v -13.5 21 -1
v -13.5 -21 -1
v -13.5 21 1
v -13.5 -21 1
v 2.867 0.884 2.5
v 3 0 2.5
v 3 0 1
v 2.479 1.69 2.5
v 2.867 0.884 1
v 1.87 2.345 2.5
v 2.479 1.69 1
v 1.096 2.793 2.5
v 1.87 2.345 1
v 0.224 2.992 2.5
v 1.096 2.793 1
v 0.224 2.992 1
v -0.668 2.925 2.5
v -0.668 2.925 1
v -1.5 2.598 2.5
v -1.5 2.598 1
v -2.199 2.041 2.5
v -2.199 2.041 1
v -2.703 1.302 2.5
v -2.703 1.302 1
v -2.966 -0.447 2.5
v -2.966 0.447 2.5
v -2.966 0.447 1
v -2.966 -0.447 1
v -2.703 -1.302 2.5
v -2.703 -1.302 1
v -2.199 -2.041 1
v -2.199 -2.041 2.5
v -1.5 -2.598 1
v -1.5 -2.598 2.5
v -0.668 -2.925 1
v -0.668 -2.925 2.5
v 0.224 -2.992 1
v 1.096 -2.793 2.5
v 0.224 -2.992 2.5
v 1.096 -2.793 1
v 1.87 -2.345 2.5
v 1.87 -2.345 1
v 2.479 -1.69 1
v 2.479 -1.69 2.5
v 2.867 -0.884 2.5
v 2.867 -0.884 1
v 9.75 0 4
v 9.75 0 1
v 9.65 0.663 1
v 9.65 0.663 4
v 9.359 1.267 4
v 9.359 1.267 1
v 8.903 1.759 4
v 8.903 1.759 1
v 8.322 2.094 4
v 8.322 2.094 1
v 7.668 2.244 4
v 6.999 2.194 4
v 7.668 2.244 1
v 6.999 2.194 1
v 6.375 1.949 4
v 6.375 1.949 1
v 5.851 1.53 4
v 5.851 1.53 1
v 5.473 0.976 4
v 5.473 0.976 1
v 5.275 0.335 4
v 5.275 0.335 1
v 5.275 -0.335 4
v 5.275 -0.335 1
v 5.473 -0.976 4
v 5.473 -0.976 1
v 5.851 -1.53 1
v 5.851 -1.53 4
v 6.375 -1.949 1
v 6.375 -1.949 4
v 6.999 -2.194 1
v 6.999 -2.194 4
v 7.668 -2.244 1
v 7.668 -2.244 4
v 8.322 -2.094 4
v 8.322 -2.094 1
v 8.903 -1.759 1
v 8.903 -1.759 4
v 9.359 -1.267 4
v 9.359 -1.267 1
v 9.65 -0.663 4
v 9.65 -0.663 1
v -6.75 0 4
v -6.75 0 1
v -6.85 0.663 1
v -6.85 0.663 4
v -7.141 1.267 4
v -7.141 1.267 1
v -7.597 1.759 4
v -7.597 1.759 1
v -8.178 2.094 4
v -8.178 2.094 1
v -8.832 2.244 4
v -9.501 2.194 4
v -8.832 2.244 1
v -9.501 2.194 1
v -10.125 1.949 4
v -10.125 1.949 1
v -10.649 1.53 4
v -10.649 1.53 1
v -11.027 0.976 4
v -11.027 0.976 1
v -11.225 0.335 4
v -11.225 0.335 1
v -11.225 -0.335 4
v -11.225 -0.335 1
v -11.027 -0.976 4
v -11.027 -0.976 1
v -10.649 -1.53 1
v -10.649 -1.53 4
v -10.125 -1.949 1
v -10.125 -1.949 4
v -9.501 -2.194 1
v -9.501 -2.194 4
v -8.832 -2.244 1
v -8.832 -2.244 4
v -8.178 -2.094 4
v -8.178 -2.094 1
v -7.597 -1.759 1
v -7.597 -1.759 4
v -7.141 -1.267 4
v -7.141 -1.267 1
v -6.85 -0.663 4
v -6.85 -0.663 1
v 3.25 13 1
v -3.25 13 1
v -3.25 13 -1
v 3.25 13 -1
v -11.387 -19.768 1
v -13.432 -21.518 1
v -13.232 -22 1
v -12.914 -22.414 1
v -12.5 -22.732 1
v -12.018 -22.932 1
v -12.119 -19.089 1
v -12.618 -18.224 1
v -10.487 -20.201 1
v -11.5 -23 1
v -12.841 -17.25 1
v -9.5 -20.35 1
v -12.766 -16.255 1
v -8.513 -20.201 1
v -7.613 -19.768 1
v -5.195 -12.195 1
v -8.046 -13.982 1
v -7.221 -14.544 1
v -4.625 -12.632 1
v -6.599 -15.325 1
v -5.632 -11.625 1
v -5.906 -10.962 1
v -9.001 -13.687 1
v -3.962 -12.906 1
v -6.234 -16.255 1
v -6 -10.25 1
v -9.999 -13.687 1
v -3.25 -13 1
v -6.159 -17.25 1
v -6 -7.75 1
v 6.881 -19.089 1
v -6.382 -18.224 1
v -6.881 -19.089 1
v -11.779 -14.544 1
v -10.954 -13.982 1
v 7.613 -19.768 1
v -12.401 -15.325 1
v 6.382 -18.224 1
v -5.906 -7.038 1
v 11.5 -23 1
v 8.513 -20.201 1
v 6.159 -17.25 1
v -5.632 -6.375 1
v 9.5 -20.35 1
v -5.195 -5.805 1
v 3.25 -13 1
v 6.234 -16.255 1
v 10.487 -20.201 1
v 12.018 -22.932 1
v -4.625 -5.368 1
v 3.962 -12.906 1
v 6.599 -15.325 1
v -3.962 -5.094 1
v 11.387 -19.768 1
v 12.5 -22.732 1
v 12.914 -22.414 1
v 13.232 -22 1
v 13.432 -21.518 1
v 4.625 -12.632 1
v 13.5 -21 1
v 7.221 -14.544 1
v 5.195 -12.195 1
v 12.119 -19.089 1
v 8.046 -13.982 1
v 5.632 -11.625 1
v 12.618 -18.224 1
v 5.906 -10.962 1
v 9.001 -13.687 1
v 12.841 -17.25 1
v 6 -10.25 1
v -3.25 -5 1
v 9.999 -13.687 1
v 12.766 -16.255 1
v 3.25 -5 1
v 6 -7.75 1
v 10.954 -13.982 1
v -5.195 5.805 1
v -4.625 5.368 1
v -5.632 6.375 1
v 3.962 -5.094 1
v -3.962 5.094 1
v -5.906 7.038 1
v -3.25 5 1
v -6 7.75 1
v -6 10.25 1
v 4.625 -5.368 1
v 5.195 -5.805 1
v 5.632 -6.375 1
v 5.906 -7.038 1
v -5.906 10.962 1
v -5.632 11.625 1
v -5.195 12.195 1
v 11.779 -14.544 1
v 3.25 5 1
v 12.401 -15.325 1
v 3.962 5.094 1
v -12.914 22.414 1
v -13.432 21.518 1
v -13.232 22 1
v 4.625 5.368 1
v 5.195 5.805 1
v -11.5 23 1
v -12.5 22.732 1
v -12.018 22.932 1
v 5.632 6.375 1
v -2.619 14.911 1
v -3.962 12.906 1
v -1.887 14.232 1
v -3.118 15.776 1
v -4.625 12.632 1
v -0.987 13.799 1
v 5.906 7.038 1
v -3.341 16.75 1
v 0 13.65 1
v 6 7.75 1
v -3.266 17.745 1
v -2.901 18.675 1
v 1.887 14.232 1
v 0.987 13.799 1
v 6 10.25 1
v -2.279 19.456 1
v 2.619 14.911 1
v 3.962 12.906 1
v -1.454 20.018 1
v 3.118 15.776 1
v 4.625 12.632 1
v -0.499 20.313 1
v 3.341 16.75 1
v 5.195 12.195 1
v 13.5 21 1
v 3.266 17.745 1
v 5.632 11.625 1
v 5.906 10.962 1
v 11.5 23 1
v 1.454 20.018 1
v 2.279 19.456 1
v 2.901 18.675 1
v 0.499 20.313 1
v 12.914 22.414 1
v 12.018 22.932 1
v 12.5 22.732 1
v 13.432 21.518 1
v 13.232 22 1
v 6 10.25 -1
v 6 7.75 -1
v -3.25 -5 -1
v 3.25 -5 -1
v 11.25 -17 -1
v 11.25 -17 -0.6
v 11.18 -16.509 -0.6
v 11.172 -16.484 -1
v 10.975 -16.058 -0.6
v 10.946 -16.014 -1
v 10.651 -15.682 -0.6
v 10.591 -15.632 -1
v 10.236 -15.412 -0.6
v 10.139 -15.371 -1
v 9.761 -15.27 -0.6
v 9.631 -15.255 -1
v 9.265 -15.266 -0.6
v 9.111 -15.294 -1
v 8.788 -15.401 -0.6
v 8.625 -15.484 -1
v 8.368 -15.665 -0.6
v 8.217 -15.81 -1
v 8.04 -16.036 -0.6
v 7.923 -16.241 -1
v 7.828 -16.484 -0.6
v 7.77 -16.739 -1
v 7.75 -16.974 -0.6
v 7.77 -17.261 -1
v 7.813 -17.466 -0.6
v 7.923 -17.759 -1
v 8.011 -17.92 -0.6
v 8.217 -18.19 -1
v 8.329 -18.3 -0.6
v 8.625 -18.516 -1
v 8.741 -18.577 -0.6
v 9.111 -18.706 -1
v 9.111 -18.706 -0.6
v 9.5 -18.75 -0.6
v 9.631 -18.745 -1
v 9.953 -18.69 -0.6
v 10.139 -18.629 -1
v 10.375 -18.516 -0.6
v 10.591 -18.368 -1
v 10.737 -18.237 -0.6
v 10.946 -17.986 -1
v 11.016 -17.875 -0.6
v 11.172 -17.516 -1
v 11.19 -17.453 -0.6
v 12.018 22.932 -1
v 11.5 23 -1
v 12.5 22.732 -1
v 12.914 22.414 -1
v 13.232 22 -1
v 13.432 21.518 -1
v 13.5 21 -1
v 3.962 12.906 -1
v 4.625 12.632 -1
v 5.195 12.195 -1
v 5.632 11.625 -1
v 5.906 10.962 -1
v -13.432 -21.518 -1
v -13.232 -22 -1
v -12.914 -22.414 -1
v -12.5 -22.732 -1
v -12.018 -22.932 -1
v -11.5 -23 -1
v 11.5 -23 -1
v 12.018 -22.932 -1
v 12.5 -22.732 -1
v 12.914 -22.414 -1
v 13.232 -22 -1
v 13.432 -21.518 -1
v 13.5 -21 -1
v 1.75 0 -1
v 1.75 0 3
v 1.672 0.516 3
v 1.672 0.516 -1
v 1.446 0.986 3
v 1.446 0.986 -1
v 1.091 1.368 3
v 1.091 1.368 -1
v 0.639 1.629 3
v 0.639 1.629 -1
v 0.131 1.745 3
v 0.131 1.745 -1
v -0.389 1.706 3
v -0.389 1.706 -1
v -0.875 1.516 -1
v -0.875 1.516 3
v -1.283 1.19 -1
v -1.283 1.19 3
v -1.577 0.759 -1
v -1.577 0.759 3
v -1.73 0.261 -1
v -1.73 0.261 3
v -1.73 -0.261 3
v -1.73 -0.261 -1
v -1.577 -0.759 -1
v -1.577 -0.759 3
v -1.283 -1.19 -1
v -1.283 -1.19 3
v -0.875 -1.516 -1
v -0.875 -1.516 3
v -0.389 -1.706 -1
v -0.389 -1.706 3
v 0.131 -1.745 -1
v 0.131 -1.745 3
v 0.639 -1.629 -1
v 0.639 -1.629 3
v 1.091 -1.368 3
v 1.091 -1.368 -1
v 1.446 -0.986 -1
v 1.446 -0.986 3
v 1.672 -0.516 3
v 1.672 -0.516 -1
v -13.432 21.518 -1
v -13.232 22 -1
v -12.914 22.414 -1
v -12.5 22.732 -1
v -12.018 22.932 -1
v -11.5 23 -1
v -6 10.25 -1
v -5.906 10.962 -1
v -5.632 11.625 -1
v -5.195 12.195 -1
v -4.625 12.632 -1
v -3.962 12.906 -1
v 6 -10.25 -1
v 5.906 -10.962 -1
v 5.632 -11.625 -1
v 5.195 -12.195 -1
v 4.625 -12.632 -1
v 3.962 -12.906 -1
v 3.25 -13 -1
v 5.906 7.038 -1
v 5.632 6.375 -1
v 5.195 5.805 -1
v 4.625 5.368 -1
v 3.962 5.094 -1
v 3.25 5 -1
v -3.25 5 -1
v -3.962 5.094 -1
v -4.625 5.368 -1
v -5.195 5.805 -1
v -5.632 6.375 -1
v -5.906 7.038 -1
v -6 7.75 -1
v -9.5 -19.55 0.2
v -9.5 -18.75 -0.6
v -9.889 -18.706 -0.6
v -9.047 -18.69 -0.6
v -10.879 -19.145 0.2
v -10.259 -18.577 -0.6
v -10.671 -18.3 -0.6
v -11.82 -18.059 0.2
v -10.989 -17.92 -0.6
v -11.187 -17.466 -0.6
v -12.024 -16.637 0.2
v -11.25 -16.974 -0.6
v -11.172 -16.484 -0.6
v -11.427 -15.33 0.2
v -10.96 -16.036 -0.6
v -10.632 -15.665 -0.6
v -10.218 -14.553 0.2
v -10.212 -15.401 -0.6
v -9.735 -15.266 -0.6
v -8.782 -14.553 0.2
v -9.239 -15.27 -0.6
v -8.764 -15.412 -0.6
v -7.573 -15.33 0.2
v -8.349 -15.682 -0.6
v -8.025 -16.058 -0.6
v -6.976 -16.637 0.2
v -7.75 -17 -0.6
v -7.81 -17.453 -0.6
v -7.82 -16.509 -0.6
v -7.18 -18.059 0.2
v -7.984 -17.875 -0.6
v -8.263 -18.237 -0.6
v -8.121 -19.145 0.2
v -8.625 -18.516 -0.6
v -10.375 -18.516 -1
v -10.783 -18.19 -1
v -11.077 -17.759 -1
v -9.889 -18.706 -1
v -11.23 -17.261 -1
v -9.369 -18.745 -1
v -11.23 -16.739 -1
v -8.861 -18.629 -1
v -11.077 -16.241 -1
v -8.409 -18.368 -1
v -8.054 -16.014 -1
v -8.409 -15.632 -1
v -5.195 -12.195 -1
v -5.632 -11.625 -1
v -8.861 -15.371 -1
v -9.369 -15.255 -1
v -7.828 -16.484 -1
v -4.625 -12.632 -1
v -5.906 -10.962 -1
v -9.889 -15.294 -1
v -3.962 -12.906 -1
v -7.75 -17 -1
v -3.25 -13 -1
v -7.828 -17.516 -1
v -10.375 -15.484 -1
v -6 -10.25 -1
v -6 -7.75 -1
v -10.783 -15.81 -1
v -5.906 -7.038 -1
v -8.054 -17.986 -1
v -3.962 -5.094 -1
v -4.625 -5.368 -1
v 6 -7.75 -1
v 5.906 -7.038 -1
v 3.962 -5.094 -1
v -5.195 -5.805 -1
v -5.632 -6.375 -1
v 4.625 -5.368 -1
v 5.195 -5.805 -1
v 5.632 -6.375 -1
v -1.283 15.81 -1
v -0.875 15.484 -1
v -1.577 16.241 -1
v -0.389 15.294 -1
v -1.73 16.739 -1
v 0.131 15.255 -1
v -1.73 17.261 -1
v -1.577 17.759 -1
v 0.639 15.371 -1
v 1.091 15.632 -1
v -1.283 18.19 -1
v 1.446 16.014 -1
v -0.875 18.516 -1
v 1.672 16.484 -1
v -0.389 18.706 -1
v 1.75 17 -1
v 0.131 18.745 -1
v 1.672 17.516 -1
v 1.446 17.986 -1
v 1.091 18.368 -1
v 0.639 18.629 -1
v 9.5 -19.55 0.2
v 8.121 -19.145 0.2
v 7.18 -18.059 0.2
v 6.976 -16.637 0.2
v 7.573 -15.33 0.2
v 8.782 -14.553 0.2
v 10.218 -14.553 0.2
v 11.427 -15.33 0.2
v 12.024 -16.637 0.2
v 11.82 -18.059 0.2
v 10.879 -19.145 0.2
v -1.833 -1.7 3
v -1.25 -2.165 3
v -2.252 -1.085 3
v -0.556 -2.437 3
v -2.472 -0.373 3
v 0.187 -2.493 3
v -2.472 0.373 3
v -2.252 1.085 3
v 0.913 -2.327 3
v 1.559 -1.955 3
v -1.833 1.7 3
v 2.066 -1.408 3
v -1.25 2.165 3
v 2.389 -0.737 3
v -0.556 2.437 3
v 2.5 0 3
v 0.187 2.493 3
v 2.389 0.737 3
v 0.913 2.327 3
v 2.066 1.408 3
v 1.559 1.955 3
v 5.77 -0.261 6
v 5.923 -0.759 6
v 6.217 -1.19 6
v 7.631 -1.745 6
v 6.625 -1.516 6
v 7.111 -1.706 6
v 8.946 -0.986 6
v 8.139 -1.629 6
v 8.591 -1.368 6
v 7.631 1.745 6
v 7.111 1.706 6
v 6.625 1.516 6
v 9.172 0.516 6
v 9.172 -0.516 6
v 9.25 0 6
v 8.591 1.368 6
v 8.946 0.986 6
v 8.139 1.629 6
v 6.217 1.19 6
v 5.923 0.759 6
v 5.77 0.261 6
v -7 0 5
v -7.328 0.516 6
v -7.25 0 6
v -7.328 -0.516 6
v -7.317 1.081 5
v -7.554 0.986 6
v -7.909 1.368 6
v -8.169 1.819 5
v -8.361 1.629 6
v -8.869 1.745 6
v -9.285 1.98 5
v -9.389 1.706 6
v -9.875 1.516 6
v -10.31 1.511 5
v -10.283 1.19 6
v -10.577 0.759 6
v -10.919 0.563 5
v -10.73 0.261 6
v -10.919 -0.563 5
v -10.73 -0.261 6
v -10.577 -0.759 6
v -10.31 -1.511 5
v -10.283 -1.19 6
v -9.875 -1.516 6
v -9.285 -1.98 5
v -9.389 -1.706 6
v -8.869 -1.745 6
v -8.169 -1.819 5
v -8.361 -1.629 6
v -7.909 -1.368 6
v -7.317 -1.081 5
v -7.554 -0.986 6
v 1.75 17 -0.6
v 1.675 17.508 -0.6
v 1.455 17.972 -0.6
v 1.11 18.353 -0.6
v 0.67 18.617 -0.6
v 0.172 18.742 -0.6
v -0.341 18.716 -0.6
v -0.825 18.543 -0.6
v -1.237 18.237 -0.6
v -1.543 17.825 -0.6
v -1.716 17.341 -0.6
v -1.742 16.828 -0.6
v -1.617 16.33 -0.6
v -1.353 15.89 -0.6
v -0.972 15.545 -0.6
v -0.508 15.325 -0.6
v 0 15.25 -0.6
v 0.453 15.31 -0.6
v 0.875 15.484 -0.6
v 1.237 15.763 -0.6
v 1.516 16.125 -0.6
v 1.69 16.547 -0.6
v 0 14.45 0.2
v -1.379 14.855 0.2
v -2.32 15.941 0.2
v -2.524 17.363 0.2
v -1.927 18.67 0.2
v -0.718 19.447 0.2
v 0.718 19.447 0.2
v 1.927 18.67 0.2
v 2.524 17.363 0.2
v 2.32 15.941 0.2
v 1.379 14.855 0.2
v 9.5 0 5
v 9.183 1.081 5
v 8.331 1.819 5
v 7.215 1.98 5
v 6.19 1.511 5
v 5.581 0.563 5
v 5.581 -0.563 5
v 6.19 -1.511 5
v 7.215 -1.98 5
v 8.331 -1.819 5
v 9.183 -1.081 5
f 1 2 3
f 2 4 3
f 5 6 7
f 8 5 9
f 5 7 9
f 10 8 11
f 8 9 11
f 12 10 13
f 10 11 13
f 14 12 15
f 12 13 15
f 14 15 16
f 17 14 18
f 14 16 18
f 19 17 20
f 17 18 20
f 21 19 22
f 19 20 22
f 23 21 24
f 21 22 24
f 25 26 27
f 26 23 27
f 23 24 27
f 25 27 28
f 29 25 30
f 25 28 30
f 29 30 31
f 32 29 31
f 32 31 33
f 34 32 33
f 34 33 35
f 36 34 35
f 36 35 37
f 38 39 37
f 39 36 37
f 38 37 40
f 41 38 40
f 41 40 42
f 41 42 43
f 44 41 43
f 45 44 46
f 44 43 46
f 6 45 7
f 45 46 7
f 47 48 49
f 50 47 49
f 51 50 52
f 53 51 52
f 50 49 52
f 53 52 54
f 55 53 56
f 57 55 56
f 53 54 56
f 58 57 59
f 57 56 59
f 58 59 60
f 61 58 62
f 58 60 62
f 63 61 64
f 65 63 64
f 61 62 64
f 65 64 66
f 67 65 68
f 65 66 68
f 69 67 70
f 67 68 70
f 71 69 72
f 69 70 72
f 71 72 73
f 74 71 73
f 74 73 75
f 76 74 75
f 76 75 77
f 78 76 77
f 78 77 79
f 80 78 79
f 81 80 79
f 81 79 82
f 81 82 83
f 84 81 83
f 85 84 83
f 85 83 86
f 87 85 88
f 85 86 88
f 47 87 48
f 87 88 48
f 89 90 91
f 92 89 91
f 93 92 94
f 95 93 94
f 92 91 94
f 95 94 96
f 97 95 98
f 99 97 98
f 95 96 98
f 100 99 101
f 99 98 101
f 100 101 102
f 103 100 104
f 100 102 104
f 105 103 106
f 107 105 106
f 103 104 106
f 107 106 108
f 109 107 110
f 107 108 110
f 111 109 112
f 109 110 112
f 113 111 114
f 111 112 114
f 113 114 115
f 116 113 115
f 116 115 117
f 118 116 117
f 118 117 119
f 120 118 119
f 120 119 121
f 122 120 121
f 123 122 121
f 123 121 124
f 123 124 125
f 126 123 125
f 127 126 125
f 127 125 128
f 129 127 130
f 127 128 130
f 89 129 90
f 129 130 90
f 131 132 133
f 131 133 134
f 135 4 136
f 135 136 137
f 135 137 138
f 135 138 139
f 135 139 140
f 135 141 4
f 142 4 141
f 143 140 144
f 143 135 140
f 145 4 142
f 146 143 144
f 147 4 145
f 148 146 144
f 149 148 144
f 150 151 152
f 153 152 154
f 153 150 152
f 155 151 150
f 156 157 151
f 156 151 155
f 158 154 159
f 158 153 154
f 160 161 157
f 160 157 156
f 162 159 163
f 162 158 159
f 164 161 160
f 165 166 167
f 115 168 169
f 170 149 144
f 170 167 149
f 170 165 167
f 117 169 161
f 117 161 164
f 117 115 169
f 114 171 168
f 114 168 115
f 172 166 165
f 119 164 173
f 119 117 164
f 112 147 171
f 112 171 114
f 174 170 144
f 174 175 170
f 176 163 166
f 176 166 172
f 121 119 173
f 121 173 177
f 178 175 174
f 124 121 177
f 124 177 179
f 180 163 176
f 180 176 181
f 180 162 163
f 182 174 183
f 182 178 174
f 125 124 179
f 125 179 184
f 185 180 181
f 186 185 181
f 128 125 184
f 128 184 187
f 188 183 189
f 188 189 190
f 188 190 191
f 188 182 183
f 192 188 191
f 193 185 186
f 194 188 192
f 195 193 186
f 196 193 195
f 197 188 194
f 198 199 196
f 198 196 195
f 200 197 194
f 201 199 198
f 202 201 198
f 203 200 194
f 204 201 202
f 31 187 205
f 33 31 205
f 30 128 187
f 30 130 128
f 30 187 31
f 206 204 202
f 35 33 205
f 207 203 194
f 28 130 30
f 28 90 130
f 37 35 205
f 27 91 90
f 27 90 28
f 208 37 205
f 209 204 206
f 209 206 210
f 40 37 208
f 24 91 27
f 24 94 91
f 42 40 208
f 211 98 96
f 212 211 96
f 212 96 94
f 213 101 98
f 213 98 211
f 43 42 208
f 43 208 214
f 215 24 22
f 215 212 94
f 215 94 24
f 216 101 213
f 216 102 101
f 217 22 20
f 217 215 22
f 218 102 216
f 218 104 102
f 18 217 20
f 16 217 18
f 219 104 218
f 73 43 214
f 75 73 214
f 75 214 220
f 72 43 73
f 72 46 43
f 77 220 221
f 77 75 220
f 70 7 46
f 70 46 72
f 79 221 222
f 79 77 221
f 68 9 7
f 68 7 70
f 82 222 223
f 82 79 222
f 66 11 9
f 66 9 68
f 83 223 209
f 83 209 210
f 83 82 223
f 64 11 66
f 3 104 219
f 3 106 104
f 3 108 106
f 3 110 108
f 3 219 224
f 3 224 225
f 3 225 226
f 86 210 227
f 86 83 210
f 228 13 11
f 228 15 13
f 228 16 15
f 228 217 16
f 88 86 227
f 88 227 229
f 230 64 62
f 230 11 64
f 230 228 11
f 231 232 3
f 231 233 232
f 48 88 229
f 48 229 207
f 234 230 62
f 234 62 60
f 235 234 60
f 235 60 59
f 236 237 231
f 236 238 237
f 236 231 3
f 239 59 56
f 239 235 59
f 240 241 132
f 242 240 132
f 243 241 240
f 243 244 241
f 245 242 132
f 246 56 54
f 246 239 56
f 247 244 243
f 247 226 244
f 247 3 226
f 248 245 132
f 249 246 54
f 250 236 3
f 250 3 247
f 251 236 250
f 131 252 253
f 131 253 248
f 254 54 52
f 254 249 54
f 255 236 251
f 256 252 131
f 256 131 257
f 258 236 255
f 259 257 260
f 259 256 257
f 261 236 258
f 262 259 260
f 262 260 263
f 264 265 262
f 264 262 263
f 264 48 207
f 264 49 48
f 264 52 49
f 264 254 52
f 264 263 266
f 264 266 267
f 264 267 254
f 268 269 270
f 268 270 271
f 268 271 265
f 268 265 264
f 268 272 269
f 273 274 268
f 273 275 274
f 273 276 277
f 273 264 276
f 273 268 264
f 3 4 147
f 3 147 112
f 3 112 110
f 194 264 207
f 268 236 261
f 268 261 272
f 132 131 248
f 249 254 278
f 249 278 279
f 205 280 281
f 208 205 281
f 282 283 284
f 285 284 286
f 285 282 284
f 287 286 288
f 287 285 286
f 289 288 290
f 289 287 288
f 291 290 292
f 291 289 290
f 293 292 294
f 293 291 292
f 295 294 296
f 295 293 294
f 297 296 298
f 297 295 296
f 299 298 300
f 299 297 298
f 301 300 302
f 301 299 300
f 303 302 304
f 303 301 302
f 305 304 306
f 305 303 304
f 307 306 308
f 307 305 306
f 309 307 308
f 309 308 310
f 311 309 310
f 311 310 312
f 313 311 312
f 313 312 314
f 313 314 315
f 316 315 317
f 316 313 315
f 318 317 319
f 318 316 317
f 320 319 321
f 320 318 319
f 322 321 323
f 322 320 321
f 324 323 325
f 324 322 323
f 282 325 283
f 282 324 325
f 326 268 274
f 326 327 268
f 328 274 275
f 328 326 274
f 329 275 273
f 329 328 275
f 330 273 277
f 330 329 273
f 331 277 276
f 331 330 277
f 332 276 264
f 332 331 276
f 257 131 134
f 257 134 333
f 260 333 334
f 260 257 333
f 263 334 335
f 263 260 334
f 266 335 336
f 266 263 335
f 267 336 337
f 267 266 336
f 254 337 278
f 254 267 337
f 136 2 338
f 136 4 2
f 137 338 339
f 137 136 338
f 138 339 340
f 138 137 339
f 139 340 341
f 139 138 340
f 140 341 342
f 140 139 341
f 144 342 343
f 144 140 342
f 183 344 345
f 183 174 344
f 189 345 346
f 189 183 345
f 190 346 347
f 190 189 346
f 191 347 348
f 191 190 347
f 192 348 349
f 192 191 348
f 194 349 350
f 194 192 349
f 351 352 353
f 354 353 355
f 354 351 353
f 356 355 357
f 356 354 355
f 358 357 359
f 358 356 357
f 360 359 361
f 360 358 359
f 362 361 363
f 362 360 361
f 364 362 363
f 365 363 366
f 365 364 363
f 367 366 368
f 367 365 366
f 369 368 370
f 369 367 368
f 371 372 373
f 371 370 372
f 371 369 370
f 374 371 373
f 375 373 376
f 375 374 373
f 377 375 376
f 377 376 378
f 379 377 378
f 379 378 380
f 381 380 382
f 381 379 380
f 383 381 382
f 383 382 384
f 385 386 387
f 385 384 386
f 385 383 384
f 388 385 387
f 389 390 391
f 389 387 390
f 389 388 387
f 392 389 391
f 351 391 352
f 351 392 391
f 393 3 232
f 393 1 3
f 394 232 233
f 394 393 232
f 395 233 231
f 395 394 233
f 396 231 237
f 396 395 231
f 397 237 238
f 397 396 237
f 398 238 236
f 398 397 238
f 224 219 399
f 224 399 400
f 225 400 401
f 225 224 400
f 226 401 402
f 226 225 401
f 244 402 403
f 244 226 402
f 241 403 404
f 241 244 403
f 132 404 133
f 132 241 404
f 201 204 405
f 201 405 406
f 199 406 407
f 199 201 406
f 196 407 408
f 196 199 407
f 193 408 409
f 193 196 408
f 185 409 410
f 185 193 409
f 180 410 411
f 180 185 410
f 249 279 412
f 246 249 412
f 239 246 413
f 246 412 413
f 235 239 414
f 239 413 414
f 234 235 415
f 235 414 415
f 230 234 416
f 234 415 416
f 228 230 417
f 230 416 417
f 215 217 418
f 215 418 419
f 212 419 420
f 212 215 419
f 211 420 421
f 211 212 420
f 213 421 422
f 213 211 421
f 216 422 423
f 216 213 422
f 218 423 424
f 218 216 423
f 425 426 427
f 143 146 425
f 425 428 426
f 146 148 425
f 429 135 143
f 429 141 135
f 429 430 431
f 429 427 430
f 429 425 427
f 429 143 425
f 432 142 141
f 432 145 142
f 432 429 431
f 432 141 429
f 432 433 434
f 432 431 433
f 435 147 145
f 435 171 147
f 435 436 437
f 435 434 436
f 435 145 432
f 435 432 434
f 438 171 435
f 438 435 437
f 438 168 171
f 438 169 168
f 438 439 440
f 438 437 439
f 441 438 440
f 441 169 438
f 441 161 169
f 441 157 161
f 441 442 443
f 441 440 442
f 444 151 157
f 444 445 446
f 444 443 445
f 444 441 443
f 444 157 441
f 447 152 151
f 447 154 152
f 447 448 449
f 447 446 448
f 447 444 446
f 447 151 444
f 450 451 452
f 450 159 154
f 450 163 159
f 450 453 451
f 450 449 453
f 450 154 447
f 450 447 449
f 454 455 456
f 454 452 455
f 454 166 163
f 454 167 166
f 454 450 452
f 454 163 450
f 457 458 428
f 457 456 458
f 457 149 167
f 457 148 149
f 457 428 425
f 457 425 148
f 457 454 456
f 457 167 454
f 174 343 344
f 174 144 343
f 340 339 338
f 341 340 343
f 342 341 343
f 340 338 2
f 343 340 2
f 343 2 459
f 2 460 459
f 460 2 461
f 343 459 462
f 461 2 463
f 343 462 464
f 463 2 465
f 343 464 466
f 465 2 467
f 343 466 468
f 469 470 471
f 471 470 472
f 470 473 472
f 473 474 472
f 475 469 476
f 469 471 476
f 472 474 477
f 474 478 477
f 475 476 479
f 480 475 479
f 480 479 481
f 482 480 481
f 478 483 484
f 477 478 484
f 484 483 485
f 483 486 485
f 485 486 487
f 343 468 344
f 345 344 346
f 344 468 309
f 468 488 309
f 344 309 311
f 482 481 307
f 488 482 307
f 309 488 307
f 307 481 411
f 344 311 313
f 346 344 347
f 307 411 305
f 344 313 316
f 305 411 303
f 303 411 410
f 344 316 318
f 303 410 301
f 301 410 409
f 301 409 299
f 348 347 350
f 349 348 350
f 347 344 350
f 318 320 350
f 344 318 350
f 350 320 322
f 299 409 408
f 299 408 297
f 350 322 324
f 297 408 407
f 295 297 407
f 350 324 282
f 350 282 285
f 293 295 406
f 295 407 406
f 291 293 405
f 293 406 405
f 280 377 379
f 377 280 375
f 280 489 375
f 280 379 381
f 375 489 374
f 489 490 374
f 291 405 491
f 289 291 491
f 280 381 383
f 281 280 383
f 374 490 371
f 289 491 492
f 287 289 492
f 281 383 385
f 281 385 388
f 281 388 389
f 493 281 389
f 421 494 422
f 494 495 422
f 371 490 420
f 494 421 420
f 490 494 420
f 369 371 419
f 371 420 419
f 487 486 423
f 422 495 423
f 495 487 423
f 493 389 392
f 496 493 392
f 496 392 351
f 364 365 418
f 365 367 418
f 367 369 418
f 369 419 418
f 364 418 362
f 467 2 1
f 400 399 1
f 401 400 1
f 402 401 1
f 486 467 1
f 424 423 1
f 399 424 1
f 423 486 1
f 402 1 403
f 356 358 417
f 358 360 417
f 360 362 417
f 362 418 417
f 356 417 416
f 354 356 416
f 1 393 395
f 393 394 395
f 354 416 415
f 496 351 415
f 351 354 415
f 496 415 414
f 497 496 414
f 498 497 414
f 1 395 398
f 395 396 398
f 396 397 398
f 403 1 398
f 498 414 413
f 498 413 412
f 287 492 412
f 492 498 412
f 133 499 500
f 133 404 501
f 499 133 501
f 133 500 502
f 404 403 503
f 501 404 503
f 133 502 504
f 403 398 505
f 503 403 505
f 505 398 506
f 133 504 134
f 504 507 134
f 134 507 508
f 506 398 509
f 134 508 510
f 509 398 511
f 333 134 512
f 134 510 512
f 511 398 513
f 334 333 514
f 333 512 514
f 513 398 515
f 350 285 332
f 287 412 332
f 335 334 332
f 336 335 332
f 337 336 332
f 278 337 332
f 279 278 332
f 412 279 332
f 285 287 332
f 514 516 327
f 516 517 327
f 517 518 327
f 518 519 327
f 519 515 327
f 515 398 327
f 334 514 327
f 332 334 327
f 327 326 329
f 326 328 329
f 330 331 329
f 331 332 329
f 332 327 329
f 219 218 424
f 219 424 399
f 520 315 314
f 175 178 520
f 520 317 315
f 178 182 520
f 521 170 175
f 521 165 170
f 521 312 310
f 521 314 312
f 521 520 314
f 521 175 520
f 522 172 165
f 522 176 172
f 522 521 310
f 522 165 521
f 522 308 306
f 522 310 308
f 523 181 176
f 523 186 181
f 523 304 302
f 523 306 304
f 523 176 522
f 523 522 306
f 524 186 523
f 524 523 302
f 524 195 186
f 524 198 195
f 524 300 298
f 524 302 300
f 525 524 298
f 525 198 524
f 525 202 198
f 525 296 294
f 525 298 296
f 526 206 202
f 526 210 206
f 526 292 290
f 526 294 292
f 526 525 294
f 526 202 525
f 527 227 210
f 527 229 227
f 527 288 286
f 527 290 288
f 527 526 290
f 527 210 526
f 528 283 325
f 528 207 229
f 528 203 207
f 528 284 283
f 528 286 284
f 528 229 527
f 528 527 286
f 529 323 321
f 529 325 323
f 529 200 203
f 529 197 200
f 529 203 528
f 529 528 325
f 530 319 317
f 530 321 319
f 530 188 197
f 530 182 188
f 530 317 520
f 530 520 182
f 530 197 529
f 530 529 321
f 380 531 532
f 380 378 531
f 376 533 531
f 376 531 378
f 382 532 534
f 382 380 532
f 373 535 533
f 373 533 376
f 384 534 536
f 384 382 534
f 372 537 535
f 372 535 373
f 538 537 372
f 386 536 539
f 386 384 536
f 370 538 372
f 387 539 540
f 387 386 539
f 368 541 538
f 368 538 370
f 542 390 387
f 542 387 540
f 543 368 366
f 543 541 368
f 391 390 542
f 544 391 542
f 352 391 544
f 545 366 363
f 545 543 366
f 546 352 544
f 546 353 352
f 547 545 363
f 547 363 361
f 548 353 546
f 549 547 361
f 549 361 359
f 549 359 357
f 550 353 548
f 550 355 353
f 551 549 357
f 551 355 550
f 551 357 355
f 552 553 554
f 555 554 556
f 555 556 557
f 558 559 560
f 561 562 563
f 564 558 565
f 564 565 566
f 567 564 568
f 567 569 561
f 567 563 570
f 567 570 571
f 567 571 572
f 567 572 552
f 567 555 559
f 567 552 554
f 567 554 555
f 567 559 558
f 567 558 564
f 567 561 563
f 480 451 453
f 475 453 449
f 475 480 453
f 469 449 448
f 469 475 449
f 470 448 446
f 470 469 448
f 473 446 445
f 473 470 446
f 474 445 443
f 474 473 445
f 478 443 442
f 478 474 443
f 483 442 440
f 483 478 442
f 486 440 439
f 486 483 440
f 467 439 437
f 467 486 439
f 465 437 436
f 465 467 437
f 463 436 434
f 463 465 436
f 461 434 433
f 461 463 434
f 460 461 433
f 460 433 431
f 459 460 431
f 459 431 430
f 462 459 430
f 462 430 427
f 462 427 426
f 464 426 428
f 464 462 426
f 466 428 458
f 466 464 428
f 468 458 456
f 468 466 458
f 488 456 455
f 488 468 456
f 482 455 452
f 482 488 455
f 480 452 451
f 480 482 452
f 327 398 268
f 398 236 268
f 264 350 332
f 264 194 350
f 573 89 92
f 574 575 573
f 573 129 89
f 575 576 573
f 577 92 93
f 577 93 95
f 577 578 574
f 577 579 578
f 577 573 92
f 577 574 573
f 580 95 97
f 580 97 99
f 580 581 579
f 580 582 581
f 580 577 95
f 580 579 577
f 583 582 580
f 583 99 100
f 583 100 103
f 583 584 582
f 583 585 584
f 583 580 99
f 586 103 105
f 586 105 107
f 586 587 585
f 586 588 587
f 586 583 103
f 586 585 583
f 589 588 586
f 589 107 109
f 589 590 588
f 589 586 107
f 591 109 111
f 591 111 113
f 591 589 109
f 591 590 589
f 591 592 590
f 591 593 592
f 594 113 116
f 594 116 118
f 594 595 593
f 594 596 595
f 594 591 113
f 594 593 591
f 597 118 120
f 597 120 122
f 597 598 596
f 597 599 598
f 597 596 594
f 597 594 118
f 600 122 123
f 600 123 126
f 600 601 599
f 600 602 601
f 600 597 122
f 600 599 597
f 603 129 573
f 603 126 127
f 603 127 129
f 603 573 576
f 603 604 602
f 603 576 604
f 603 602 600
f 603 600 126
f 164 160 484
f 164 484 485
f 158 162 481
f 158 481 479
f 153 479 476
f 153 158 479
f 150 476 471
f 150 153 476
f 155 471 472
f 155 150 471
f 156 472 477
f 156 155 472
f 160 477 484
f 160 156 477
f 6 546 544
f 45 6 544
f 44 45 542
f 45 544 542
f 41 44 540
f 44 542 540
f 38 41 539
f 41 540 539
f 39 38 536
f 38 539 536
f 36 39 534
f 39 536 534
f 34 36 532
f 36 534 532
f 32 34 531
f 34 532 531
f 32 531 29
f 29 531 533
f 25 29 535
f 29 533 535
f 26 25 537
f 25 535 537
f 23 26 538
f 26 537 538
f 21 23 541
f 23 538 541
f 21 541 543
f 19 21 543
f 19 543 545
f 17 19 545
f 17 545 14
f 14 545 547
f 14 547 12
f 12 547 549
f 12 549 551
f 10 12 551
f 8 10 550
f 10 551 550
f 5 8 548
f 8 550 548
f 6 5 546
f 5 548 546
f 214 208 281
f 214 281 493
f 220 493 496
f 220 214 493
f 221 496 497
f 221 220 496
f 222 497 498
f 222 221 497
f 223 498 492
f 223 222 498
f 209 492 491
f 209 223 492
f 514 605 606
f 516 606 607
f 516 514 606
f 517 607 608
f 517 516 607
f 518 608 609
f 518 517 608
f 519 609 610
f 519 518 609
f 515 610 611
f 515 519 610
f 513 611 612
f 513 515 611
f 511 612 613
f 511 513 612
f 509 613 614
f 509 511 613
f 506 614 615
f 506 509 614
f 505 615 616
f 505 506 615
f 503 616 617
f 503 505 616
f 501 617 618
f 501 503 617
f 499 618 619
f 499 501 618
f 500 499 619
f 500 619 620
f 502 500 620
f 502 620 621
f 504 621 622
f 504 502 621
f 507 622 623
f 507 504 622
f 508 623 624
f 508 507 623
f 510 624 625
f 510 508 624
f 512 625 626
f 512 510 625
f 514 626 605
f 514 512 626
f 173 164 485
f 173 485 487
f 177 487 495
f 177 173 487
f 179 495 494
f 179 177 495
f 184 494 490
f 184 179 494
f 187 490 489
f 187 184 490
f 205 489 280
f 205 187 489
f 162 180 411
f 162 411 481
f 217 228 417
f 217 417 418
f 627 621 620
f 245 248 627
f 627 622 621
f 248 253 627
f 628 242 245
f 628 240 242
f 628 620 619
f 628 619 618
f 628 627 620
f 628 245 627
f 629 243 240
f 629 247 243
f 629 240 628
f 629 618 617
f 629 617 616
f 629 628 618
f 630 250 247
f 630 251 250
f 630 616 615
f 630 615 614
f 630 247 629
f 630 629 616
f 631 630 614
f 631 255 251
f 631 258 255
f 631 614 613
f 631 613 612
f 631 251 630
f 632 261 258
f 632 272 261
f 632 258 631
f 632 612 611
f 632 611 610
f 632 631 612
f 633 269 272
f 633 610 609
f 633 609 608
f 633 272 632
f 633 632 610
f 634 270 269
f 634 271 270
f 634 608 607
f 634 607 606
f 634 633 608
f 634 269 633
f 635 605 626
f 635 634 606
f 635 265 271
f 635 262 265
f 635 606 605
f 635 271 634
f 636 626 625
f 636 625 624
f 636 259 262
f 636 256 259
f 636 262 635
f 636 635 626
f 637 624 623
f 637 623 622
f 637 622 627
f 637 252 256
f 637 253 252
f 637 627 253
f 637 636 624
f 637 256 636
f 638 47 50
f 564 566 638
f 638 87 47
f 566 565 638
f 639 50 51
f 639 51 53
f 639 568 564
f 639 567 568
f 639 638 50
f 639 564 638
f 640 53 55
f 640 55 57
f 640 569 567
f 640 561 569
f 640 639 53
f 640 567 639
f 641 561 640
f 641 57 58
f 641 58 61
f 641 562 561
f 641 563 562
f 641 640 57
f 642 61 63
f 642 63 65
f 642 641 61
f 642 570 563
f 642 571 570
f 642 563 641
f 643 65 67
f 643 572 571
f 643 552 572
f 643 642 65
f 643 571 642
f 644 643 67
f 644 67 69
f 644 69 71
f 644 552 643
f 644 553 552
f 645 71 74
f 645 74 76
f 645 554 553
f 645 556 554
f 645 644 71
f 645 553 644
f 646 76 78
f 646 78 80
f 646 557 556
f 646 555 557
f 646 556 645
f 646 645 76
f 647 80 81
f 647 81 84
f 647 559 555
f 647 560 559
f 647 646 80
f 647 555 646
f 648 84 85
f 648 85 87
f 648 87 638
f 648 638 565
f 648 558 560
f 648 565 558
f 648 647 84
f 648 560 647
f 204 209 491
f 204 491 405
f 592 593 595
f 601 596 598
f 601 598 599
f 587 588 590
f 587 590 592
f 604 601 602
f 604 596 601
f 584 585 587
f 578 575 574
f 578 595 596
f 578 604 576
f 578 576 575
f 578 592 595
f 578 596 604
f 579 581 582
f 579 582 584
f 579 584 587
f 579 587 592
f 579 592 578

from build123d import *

# Parameters (mm, degrees)
SKETCH1_W                                    = 27
SKETCH1_H                                    = 46
SKETCH1_R                                    = 1.75
BOSS_EXTRUDE1_DEPTH                          = 1
SKETCH2_R                                    = 3
SKETCH2_R_2                                  = 1.75
SKETCH2_R_3                                  = 2.25
BOSS_EXTRUDE2_DEPTH                          = 5
SKETCH3_R                                    = 3.5
CUT_EXTRUDE1_DEPTH                           = 3
CHAMFER1_SIZE                                = 2
CHAMFER1_SIZE2                               = 0.5
CHAMFER1_PART_2_SIZE                         = 2
CHAMFER1_PART_2_SIZE2                        = 0.5
CHAMFER2_SIZE                                = 0.5
CSK_FOR_M3_FLAT_COUNTERSUNK_HEAD_SCR_2_COUNT = 2
CSK_FOR_M3_FLAT_COUNTERSUNK_HEAD_SCR_2_PITCH = 35.302266216
CSK_FOR_M3_FLAT_COUNTERSUNK_HEAD_SCR_3_COUNT = 2
CSK_FOR_M3_FLAT_COUNTERSUNK_HEAD_SCR_3_PITCH = 35.302266216
FILLET1_R                                    = 2


with BuildPart() as part:
    # Sketch1 → Boss-Extrude1 (new body, symmetric)
    with BuildSketch(Plane.XY):
        Rectangle(SKETCH1_W, SKETCH1_H)
        Circle(SKETCH1_R, mode=Mode.SUBTRACT)
        with Locations((0, 17)):
            Circle(SKETCH1_R, mode=Mode.SUBTRACT)
        with Locations((-9.5, -17)):
            Circle(SKETCH1_R, mode=Mode.SUBTRACT)
        with Locations((9.5, -17)):
            Circle(SKETCH1_R, mode=Mode.SUBTRACT)
        with BuildLine():
            Line((-3.25, 13), (3.25, 13))
            ThreePointArc((3.25, 13), (5.194543648, 12.194543648), (6, 10.25))
            Line((6, 10.25), (6, 7.75))
            ThreePointArc((6, 7.75), (5.194543648, 5.805456352), (3.25, 5))
            Line((3.25, 5), (-3.25, 5))
            ThreePointArc((-3.25, 5), (-5.194543648, 5.805456352), (-6, 7.75))
            Line((-6, 7.75), (-6, 10.25))
            ThreePointArc((-6, 10.25), (-5.194543648, 12.194543648), (-3.25, 13))
        make_face(mode=Mode.SUBTRACT)
        with BuildLine():
            Line((-3.25, -5), (3.25, -5))
            ThreePointArc((3.25, -5), (5.194543648, -5.805456352), (6, -7.75))
            Line((6, -7.75), (6, -10.25))
            ThreePointArc((6, -10.25), (5.194543648, -12.194543648), (3.25, -13))
            Line((3.25, -13), (-3.25, -13))
            ThreePointArc((-3.25, -13), (-5.194543648, -12.194543648), (-6, -10.25))
            Line((-6, -10.25), (-6, -7.75))
            ThreePointArc((-6, -7.75), (-5.194543648, -5.805456352), (-3.25, -5))
        make_face(mode=Mode.SUBTRACT)
    extrude(amount=BOSS_EXTRUDE1_DEPTH, both=True)

    # Sketch2 → Boss-Extrude2 (add)
    with BuildSketch(Plane.XY.offset(1)):
        Circle(SKETCH2_R)
        Circle(SKETCH2_R_2, mode=Mode.SUBTRACT)
        with Locations((-9, 0)):
            Circle(SKETCH2_R_3)
        with Locations((7.5, 0)):
            Circle(SKETCH2_R_3)
    extrude(amount=BOSS_EXTRUDE2_DEPTH)

    # Sketch3 → Cut-Extrude1 (cut)
    with BuildSketch(Plane.XY.offset(6)):
        Circle(SKETCH3_R)
    extrude(amount=-CUT_EXTRUDE1_DEPTH, mode=Mode.SUBTRACT)

    # Chamfer1
    chamfer1_edges = [part.edges().sort_by_distance(p)[0] for p in [
        (-11.25, 0, 6),
    ]]
    chamfer1_side = [part.faces().sort_by_distance(p)[0] for p in [
        (-11.25, 0, 3.5),
    ]]
    chamfer(chamfer1_edges, length=CHAMFER1_SIZE, length2=CHAMFER1_SIZE2, reference=chamfer1_side[0])

    # Chamfer1 part 2
    chamfer1_part_2_edges = [part.edges().sort_by_distance(p)[0] for p in [
        (5.25, 0, 6),
    ]]
    chamfer1_part_2_side = [part.faces().sort_by_distance(p)[0] for p in [
        (5.25, 0, 3.5),
    ]]
    chamfer(chamfer1_part_2_edges, length=CHAMFER1_PART_2_SIZE, length2=CHAMFER1_PART_2_SIZE2, reference=chamfer1_part_2_side[0])

    # Chamfer2
    chamfer2_edges = [part.edges().sort_by_distance(p)[0] for p in [
        (-3, 0, 3),
    ]]
    chamfer(chamfer2_edges, length=CHAMFER2_SIZE)

    # Sketch5 → CSK for M3 Flat Countersunk Head Screw1 (revolve, cut)
    with BuildSketch(Plane(origin=(0, 17, 1), x_dir=(0, -1, 0), z_dir=(1, 0, 0))):
        Polygon((0, 0), (0, 2), (1.7, 2), (1.7, 1.65), (3.35, 0), align=None)
    csk_for_m3_flat_countersunk_head_screw1 = revolve(axis=Axis((0, 17, 7.35), (0, 0, -1)), mode=Mode.SUBTRACT)

    # CSK for M3 Flat Countersunk Head Scr 2: CSK for M3 Flat Countersunk Head Screw1 ×2
    with Locations(*[Vector(-0.269104537, -0.963110974, 0) * (i * CSK_FOR_M3_FLAT_COUNTERSUNK_HEAD_SCR_2_PITCH) for i in range(1, CSK_FOR_M3_FLAT_COUNTERSUNK_HEAD_SCR_2_COUNT)]):
        add(csk_for_m3_flat_countersunk_head_screw1, mode=Mode.SUBTRACT)

    # CSK for M3 Flat Countersunk Head Scr 3: CSK for M3 Flat Countersunk Head Screw1 ×2
    with Locations(*[Vector(0.269104537, -0.963110974, 0) * (i * CSK_FOR_M3_FLAT_COUNTERSUNK_HEAD_SCR_3_PITCH) for i in range(1, CSK_FOR_M3_FLAT_COUNTERSUNK_HEAD_SCR_3_COUNT)]):
        add(csk_for_m3_flat_countersunk_head_screw1, mode=Mode.SUBTRACT)

    # Fillet1
    fillet1_edges = [part.edges().sort_by_distance(p)[0] for p in [
        (-13.5, 23, 0),
        (13.5, 23, 0),
        (13.5, -23, 0),
        (-13.5, -23, 0),
    ]]
    fillet(fillet1_edges, radius=FILLET1_R)


solid = part.part
